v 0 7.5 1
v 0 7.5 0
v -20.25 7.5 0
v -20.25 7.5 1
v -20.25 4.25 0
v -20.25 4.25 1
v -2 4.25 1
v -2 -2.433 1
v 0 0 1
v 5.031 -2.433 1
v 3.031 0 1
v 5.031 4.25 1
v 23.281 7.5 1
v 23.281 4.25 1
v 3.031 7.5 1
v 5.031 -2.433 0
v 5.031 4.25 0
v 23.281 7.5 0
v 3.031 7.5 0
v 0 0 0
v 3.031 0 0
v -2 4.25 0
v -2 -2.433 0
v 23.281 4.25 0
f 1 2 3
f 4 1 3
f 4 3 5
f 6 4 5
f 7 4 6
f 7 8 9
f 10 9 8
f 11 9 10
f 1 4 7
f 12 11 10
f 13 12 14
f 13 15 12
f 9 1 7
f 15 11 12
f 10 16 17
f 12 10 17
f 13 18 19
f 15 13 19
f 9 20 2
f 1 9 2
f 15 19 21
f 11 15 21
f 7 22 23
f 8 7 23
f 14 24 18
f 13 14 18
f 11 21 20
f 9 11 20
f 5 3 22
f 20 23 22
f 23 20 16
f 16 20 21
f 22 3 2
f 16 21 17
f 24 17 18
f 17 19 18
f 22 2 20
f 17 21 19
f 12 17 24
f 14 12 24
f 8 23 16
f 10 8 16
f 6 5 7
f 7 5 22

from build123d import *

# Parameters (mm, degrees)
F1_DEPTH = 1


with BuildPart() as f1:
    # F0 (on Top) → F1 (new body)
    with BuildSketch(Plane.XY):
        Polygon((-2, 0), (0, 0), (0, 7.5), (-20.25, 7.5), (-20.25, 4.25), (-2, 4.25), align=None)
        Polygon((3.030825, 0), (0, 0), (-2, 0), (-2, -2.433287), (5.030825, -2.433287), (5.030825, 0), align=None)
        Polygon((3.030825, 7.5), (3.030825, 0), (5.030825, 0), (5.030825, 4.25), (23.280825, 4.25), (23.280825, 7.5), align=None)
    extrude(amount=F1_DEPTH)


solid = f1.part
